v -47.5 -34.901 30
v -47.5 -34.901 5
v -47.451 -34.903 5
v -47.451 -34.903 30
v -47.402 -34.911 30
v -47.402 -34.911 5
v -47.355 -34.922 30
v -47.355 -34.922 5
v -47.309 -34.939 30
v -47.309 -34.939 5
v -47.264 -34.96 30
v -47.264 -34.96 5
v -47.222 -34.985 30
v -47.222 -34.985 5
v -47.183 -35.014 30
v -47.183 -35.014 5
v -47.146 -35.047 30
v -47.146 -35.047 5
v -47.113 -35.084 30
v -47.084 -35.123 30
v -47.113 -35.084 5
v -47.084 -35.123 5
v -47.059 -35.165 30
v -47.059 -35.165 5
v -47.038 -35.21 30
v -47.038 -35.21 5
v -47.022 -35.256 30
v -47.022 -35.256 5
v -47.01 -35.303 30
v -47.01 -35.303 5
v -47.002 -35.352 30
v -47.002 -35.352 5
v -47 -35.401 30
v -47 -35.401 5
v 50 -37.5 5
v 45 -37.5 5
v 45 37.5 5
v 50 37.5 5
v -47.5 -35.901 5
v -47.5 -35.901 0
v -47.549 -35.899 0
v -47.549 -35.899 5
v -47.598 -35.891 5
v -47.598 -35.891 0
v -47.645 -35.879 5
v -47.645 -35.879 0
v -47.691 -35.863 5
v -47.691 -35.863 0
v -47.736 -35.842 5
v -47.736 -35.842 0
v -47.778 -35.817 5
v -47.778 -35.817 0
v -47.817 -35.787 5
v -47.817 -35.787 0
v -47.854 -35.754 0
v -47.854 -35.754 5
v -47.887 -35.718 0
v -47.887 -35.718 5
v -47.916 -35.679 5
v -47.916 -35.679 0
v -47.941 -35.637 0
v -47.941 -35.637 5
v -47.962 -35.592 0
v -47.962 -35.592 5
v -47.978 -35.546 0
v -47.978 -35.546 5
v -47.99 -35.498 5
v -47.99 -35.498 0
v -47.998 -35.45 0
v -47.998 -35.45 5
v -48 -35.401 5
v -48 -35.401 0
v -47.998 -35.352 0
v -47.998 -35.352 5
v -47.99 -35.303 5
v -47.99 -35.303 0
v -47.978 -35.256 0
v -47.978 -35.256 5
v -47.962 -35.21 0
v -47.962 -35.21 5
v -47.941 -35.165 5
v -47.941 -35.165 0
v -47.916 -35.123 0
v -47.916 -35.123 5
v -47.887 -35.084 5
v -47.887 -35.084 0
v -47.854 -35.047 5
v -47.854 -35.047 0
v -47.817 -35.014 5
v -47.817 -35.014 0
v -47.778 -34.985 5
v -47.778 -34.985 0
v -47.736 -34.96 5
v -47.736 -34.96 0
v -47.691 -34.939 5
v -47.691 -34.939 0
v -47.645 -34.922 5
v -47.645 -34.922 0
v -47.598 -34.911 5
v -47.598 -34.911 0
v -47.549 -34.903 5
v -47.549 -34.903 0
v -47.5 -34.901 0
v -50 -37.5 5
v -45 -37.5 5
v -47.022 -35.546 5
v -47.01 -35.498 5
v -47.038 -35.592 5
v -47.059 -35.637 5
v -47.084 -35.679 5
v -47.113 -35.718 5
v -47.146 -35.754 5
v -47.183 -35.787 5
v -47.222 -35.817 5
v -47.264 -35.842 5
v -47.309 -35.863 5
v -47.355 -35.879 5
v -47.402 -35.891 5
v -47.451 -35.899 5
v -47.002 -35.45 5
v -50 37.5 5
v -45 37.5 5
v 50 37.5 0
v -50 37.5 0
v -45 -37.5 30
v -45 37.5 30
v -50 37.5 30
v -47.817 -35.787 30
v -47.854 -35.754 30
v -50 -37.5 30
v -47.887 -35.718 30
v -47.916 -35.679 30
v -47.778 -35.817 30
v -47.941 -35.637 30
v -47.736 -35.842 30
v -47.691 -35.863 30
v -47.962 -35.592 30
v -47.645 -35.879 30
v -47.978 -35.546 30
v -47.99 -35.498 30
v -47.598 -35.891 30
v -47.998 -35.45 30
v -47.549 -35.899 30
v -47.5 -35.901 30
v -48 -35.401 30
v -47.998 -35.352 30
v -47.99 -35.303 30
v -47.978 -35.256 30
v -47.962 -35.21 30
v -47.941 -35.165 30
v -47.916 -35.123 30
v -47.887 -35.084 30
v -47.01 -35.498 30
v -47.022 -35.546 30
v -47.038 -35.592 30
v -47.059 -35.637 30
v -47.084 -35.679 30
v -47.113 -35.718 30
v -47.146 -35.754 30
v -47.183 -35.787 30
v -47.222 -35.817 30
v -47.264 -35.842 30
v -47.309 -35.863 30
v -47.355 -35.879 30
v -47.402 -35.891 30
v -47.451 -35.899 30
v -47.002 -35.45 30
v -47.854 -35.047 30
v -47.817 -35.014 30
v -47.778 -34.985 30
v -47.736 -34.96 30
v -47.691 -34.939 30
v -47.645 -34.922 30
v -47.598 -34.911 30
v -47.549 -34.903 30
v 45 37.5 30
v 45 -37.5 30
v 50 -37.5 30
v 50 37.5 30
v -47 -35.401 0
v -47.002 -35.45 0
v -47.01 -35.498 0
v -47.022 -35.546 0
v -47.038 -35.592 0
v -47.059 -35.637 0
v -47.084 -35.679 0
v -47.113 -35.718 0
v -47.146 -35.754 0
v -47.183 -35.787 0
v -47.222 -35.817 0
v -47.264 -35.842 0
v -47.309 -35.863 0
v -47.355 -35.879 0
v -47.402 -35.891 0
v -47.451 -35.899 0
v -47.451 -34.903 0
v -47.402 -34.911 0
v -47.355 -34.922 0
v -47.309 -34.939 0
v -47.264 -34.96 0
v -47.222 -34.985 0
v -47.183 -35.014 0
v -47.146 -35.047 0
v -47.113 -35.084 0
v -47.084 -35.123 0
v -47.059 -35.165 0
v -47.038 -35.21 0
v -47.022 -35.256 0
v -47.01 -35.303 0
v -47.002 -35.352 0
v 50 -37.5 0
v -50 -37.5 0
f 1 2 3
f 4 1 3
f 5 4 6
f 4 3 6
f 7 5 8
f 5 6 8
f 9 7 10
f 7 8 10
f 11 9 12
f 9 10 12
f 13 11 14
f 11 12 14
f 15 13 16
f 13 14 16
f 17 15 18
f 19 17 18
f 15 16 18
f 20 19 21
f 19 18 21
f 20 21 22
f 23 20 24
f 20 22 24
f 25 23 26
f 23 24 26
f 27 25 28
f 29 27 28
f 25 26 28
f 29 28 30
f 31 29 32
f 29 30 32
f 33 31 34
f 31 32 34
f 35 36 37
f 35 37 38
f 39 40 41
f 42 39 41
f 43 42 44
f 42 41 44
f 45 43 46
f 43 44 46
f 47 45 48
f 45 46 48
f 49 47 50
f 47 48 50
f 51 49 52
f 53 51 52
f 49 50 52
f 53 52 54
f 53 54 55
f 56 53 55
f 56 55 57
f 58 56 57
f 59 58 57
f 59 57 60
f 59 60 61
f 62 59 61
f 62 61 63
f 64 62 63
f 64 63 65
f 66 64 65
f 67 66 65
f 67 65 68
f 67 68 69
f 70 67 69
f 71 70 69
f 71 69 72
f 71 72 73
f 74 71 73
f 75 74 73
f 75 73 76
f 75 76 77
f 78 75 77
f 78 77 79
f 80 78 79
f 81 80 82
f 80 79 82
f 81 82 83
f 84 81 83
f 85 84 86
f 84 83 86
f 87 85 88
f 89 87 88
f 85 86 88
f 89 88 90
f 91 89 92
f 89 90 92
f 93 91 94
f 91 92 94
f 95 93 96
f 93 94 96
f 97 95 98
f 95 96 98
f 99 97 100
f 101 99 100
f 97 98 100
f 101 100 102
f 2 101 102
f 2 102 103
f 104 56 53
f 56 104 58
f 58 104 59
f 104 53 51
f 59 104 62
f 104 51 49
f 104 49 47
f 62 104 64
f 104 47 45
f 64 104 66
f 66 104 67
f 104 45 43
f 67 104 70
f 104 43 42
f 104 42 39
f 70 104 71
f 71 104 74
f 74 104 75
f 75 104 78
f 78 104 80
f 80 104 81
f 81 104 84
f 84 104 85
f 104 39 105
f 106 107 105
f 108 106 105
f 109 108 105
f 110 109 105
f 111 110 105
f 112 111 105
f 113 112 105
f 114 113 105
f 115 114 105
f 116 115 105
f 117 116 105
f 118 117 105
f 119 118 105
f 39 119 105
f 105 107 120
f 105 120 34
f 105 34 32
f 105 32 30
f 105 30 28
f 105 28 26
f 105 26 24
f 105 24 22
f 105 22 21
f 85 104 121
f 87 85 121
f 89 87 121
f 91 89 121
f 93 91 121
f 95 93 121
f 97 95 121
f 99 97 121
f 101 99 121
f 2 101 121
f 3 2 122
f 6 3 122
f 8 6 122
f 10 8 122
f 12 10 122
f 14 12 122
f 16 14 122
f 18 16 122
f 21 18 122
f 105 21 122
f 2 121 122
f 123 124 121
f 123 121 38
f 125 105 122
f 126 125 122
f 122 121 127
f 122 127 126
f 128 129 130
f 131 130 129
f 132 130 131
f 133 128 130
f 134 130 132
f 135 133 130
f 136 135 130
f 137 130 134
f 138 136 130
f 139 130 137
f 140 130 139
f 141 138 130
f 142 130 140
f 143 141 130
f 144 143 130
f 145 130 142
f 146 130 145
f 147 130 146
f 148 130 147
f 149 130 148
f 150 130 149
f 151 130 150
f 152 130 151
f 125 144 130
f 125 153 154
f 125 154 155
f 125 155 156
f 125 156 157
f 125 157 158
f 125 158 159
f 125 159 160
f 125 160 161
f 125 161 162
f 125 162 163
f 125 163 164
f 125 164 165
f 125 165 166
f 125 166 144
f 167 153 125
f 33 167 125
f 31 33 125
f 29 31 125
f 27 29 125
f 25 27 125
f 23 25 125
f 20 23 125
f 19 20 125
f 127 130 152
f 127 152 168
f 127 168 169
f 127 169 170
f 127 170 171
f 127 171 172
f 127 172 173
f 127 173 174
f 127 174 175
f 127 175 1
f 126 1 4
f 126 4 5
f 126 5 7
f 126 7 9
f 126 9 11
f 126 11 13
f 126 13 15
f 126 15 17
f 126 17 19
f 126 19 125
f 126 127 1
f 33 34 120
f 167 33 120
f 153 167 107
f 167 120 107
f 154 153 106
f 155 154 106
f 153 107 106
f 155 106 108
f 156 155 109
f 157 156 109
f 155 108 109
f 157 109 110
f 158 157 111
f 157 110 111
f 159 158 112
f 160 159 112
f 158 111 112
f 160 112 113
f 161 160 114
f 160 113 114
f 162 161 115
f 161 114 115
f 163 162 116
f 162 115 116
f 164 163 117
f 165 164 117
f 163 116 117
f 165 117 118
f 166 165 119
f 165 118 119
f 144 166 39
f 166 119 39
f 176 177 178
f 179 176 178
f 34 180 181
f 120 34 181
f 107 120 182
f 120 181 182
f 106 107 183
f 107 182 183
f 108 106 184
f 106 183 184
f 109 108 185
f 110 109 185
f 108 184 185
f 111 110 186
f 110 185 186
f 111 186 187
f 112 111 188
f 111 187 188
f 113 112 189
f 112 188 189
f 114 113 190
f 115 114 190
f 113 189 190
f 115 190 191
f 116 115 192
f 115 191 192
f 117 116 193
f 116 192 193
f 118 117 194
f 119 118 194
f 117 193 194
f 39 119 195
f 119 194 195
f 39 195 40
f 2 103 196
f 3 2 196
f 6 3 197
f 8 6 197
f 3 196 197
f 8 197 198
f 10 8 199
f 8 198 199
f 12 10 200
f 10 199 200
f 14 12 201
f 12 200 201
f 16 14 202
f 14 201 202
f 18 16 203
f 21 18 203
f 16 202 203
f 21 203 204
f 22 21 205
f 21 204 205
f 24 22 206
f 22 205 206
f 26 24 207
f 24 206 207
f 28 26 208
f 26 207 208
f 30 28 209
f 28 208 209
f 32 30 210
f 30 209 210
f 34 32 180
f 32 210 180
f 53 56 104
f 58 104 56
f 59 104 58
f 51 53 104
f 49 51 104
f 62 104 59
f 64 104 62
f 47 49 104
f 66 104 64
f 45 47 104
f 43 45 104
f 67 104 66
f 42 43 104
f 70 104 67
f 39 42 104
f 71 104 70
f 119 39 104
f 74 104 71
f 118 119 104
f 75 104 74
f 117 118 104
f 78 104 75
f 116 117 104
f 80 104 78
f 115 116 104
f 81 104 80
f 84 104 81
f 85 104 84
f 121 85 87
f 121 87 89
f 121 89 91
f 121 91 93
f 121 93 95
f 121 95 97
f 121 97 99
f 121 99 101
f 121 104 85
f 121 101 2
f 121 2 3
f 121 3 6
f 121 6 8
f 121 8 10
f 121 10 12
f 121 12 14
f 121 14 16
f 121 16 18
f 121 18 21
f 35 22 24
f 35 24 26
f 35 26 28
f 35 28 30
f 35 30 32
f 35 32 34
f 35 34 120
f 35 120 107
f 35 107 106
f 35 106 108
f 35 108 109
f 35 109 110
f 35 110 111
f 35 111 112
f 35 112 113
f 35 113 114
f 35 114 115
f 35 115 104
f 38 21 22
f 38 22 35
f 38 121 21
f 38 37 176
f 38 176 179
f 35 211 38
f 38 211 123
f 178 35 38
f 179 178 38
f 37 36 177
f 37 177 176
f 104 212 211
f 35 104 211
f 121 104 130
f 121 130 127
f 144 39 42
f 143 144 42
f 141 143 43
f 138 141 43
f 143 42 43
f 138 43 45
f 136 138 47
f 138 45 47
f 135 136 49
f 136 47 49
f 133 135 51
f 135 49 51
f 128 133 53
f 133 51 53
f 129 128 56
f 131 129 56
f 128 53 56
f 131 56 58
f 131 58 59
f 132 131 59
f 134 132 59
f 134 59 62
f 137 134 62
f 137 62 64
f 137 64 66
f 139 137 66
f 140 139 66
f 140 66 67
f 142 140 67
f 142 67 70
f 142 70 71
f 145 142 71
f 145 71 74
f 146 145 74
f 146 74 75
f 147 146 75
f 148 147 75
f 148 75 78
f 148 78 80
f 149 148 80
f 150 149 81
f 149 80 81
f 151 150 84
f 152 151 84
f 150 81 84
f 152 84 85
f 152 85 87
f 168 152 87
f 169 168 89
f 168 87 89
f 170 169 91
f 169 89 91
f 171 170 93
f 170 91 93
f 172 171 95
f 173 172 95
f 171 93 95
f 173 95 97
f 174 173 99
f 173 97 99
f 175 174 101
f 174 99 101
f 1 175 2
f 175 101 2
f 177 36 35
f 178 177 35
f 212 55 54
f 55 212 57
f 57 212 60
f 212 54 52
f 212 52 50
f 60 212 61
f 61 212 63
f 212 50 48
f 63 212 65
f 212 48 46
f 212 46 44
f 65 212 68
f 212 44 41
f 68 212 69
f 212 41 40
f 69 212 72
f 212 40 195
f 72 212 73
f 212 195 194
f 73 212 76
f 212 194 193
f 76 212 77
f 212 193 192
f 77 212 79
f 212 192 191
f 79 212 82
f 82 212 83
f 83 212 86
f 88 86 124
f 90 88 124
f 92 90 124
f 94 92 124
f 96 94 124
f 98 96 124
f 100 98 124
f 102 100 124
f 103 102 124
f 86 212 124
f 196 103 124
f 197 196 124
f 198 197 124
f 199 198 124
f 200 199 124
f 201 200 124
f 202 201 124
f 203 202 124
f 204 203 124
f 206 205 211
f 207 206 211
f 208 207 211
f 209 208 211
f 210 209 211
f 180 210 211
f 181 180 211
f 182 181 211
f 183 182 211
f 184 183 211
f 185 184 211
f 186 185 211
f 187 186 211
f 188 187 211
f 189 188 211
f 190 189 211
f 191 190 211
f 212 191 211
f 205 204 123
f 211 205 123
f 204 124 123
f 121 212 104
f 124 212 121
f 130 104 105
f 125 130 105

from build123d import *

# Parameters (mm, degrees)
F0_W          = 100
F0_H          = 75
F1_DEPTH      = 5
F2_W          = 5
F2_H          = 75
F3_DEPTH      = 25
F5_DEPTH      = 100
F5_DEPTH_BACK = 25


with BuildPart() as f1:
    # F0 (on Top) → F1 (new body)
    with BuildSketch(Plane.XY):
        Rectangle(F0_W, F0_H)
    extrude(amount=F1_DEPTH)


with BuildPart() as f3:
    # F2 (on face) → F3 (new body)
    with BuildSketch(Plane.XY.offset(5)):
        with Locations((-47.5, 0)):
            Rectangle(F2_W, F2_H)
        with Locations((47.5, 0)):
            Rectangle(F2_W, F2_H)
    extrude(amount=F3_DEPTH)


with BuildPart() as f5_tool:
    # F4 (on face) → F5 (new body, two sides)
    with BuildSketch(Plane(origin=(0, 0, 0), x_dir=(1, 0, 0), z_dir=(0, 0, -1))) as f5_sk:
        with BuildLine():
            ThreePointArc((-47.5, 34.900923), (-47.146447, 35.04737), (-47, 35.400923))
            ThreePointArc((-47, 35.400923), (-47.146447, 35.754477), (-47.5, 35.900923))
            Line((-47.5, 35.900923), (-47.5, 34.900923))
        make_face()
        with BuildLine():
            Line((-47.5, 34.900923), (-47.5, 35.900923))
            ThreePointArc((-47.5, 35.900923), (-48, 35.400923), (-47.5, 34.900923))
        make_face()
    extrude(amount=-F5_DEPTH)
    extrude(f5_sk.sketch, amount=-F5_DEPTH_BACK)


with BuildPart() as f1_1:
    add(f1.part)

    # F5: cut by f5_tool
    add(f5_tool.part, mode=Mode.SUBTRACT)


with BuildPart() as f3_1:
    add(f3.part)

    # F5: cut by f5_tool
    add(f5_tool.part, mode=Mode.SUBTRACT)


solid = Compound([f1_1.part, f3_1.part])
